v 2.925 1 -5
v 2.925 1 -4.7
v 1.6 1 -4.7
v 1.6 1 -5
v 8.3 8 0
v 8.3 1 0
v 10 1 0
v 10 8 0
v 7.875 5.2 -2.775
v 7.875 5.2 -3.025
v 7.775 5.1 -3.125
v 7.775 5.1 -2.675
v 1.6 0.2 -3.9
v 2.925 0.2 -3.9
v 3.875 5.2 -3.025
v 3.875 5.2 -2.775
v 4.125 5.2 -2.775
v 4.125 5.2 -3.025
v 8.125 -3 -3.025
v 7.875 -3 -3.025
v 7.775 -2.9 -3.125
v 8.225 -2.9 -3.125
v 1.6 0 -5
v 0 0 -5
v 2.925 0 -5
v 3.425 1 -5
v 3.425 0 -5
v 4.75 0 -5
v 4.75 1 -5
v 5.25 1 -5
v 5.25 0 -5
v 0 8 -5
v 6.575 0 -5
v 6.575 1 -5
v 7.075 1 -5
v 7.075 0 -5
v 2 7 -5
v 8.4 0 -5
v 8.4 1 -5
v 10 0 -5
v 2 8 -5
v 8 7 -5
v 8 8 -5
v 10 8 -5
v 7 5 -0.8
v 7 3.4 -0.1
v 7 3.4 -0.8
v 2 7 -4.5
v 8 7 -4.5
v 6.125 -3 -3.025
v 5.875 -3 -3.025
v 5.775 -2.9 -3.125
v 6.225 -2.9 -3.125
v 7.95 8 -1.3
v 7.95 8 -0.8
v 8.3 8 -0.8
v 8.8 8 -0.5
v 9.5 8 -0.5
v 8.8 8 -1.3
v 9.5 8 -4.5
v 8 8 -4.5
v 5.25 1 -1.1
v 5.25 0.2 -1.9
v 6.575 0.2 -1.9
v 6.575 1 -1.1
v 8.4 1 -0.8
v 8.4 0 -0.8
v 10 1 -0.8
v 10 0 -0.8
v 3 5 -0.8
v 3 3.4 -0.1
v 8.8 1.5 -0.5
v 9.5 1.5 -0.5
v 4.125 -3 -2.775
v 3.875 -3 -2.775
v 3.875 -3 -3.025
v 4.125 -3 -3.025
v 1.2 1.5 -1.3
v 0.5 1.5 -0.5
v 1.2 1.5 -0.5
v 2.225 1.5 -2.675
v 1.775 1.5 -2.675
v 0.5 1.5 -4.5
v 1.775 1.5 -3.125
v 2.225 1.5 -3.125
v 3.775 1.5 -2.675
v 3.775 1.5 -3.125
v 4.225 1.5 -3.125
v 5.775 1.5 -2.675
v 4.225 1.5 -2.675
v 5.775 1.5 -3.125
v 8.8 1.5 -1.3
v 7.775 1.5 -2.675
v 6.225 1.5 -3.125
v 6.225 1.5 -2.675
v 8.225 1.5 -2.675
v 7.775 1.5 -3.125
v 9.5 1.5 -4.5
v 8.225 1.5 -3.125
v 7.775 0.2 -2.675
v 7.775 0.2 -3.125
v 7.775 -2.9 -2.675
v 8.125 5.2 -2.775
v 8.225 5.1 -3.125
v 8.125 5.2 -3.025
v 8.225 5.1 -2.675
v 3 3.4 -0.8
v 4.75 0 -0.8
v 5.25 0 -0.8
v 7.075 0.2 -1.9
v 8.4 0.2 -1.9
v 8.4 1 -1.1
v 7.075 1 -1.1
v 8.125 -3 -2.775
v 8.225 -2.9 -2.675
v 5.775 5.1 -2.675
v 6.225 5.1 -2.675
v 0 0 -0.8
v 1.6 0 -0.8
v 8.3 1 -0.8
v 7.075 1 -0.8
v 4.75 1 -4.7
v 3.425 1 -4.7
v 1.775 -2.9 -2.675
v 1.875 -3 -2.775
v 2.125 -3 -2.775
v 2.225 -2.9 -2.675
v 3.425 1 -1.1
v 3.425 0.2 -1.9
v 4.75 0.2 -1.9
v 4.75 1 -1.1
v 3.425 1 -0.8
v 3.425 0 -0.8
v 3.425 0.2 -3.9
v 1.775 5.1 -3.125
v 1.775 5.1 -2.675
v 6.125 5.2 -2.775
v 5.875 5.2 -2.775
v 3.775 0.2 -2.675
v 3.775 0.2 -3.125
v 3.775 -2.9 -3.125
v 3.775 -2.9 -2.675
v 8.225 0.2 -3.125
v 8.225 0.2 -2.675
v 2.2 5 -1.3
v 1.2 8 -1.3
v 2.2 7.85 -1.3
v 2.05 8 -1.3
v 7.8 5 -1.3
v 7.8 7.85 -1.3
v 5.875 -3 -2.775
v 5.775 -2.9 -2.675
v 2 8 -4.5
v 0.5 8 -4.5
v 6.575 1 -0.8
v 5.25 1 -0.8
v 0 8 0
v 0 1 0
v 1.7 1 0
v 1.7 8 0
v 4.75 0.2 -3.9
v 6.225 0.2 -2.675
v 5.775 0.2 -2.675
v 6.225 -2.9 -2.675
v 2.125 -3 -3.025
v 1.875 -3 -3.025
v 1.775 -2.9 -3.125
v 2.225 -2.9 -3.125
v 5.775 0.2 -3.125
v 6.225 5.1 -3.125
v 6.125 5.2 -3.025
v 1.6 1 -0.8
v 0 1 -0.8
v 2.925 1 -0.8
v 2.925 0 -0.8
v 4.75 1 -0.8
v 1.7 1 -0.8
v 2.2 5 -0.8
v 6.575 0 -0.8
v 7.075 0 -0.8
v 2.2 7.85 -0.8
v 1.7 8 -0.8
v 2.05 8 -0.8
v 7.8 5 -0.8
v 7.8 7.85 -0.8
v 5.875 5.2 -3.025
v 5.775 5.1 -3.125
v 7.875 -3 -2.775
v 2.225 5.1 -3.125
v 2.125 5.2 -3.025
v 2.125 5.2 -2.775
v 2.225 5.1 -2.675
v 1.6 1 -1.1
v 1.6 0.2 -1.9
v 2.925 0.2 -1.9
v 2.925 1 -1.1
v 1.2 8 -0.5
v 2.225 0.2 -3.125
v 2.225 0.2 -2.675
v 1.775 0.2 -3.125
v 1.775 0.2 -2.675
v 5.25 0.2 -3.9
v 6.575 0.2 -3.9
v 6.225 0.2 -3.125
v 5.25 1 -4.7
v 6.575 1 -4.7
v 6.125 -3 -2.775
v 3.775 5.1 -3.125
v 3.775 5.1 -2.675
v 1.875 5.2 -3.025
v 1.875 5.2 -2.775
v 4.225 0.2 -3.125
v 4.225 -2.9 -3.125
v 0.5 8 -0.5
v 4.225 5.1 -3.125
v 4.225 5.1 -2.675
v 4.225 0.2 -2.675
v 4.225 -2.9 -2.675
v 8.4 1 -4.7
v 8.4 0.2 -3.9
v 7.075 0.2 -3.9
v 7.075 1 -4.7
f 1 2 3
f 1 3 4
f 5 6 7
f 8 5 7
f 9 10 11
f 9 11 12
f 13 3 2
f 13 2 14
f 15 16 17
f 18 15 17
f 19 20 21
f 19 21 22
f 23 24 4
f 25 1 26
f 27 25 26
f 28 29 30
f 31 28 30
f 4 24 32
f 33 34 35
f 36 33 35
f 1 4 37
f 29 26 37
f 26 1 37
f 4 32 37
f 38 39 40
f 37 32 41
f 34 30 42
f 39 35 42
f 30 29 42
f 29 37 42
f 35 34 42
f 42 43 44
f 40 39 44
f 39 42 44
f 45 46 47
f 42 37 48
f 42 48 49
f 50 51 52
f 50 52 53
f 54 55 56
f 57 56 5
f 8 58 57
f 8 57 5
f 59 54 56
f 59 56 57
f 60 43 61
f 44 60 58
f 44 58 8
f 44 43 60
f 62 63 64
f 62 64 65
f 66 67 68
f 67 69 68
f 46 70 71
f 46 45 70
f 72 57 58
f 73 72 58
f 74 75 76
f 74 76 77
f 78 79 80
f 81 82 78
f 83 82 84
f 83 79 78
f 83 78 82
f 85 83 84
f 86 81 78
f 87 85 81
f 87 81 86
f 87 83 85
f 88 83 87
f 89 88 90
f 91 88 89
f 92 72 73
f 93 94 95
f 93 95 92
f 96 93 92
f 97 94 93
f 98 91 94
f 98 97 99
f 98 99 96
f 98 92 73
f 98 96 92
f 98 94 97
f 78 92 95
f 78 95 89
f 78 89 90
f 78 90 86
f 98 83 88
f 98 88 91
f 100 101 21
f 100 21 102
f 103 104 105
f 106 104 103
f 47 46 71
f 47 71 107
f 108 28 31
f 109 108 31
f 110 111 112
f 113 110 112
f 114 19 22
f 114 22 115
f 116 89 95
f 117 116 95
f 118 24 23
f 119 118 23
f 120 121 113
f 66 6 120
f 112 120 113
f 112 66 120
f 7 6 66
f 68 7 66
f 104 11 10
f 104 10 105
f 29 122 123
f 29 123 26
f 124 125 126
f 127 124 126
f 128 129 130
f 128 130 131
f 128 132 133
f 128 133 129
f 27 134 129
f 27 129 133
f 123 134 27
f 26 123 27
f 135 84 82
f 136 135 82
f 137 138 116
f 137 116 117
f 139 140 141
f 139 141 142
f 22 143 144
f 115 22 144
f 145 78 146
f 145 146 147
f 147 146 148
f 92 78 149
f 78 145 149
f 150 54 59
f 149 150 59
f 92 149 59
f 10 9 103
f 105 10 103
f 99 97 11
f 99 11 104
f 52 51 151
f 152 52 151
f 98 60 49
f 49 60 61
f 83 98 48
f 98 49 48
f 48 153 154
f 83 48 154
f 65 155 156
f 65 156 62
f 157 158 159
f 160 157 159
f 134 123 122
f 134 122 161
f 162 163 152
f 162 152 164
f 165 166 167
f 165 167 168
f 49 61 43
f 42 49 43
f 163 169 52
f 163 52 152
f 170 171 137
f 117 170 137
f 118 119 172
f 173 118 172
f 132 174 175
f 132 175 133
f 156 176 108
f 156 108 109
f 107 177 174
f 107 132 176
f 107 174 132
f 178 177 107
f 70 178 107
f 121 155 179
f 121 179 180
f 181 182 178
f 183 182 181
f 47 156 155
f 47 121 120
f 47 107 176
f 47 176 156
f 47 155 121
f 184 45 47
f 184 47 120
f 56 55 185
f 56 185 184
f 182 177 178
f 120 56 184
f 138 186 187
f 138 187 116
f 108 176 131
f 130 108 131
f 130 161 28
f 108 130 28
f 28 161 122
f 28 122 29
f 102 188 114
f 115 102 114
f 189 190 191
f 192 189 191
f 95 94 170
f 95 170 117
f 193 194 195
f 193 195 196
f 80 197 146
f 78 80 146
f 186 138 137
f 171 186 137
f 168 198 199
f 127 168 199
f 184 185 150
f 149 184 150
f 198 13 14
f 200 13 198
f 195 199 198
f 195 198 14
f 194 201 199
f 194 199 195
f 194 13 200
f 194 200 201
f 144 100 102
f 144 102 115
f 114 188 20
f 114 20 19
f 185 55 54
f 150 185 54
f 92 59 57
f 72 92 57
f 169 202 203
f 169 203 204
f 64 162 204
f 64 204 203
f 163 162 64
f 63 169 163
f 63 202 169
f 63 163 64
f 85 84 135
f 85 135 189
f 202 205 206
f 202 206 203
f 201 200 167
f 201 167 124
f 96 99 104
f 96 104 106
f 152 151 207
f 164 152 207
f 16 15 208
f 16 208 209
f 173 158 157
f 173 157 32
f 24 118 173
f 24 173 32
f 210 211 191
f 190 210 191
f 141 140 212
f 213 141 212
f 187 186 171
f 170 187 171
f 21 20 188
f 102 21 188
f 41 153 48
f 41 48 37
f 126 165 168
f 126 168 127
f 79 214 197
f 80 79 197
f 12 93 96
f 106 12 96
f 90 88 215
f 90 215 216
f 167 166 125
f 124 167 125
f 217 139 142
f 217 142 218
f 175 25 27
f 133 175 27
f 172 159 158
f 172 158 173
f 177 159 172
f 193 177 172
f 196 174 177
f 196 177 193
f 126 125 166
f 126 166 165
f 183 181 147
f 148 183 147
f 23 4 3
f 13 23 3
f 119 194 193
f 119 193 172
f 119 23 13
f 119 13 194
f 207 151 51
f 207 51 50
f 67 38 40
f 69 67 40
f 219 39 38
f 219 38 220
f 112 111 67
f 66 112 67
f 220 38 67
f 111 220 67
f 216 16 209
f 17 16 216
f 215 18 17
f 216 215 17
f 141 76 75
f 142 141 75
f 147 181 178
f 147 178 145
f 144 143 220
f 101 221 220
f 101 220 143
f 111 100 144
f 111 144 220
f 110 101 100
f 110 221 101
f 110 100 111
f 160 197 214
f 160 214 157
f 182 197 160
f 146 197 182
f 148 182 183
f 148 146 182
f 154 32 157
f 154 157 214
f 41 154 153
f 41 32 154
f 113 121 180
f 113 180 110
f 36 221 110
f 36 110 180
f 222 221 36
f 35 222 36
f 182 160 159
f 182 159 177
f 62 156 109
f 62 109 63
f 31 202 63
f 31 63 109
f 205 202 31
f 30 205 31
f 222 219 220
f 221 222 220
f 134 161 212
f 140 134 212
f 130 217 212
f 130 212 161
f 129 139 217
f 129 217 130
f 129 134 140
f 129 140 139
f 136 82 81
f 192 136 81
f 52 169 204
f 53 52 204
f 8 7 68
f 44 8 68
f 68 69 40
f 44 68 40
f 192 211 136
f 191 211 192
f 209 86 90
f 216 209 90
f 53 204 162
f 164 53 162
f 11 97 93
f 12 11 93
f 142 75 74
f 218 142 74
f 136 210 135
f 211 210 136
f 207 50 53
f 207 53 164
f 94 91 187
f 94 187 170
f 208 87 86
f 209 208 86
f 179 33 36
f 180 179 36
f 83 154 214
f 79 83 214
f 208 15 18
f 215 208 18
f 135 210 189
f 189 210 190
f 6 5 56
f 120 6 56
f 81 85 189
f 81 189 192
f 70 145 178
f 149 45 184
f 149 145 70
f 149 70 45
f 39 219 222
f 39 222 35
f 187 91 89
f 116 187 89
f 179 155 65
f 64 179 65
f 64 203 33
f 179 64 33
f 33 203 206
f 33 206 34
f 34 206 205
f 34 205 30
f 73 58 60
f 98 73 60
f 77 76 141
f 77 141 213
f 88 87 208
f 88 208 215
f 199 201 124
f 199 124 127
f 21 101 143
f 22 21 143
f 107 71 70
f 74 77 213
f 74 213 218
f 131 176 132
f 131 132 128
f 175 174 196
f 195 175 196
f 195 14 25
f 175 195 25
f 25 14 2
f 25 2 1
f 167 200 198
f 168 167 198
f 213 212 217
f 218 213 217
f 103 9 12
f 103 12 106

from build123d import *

# Parameters (mm, degrees)
ESQUISSE1_W             = 10
ESQUISSE1_H             = 5
BOSS_EXTRU_1_DEPTH      = 8
ESQUISSE2_W             = 6.6
ESQUISSE2_H             = 0.8
ENL_V_MAT_EXTRU_1_DEPTH = 8
ENL_V_MAT_EXTRU_2_DEPTH = 6.5
ESQUISSE5_W             = 6
ESQUISSE5_H             = 0.5
ENL_V_MAT_EXTRU_3_DEPTH = 1
ESQUISSE6_W             = 5.6
ESQUISSE6_H             = 0.5
ENL_V_MAT_EXTRU_4_DEPTH = 3
ESQUISSE7_W             = 0.8
ESQUISSE7_H             = 1
ENL_V_MAT_EXTRU_5_DEPTH = 10
ESQUISSE8_W             = 6.8
ESQUISSE8_H             = 4.2
ENL_V_MAT_EXTRU_6_DEPTH = 1
BOSS_EXTRU_2_DEPTH      = 6.8
BOSS_EXTRU_3_DEPTH      = 2
BOSS_EXTRU_3_DEPTH_BACK = 2
ESQUISSE12_W            = 0.5
ESQUISSE12_H            = 4.2
BOSS_EXTRU_4_DEPTH      = 1
CHANFREIN1_SIZE         = 0.15
ESQUISSE13_W            = 0.45
ESQUISSE13_H            = 0.45
BOSS_EXTRU_5_DEPTH      = 3.2
BOSS_EXTRU_5_DEPTH_BACK = 5
CHANFREIN2_SIZE         = 0.1


with BuildPart() as part:
    # Esquisse1 → Boss.-Extru.1 (new body)
    with BuildSketch(Plane(origin=(0, 0, 0), x_dir=(1, 0, 0), z_dir=(0, 1, 0))):
        with Locations((5, 2.5)):
            Rectangle(ESQUISSE1_W, ESQUISSE1_H)
    extrude(amount=BOSS_EXTRU_1_DEPTH)

    # Esquisse2 → Enlèv. mat.-Extru.1 (cut)
    with BuildSketch(Plane(origin=(0, 8, 0), x_dir=(1, 0, 0), z_dir=(0, 1, 0))):
        with Locations((5, 0.4)):
            Rectangle(ESQUISSE2_W, ESQUISSE2_H)
    extrude(amount=-ENL_V_MAT_EXTRU_1_DEPTH, mode=Mode.SUBTRACT)

    # Esquisse4 → Enlèv. mat.-Extru.2 (cut)
    with BuildSketch(Plane(origin=(0, 8, 0), x_dir=(1, 0, 0), z_dir=(0, 1, 0))):
        Polygon((0.5, 0.5), (1.2, 0.5), (1.2, 1.3), (8.8, 1.3), (8.8, 0.5), (9.5, 0.5), (9.5, 4.5), (0.5, 4.5), align=None)
    extrude(amount=-ENL_V_MAT_EXTRU_2_DEPTH, mode=Mode.SUBTRACT)

    # Esquisse5 → Enlèv. mat.-Extru.3 (cut)
    with BuildSketch(Plane(origin=(0, 8, 0), x_dir=(1, 0, 0), z_dir=(0, 1, 0))):
        with Locations((5, 4.75)):
            Rectangle(ESQUISSE5_W, ESQUISSE5_H)
    extrude(amount=-ENL_V_MAT_EXTRU_3_DEPTH, mode=Mode.SUBTRACT)

    # Esquisse6 → Enlèv. mat.-Extru.4 (cut)
    with BuildSketch(Plane(origin=(0, 8, 0), x_dir=(1, 0, 0), z_dir=(0, 1, 0))):
        with Locations((5, 1.05)):
            Rectangle(ESQUISSE6_W, ESQUISSE6_H)
    extrude(amount=-ENL_V_MAT_EXTRU_4_DEPTH, mode=Mode.SUBTRACT)

    # Esquisse7 → Enlèv. mat.-Extru.5 (cut)
    with BuildSketch(Plane(origin=(10, 0, 0), x_dir=(0, 0, -1), z_dir=(1, 0, 0))):
        with Locations((0.4, 0.5)):
            Rectangle(ESQUISSE7_W, ESQUISSE7_H)
    extrude(amount=-ENL_V_MAT_EXTRU_5_DEPTH, mode=Mode.SUBTRACT)

    # Esquisse8 → Enlèv. mat.-Extru.6 (cut)
    with BuildSketch(Plane.XZ):
        with Locations((5, -2.9)):
            Rectangle(ESQUISSE8_W, ESQUISSE8_H)
    extrude(amount=-ENL_V_MAT_EXTRU_6_DEPTH, mode=Mode.SUBTRACT)

    # Esquisse9 → Boss.-Extru.2 (add)
    with BuildSketch(Plane(origin=(1.6, 0, 0), x_dir=(0, 0, -1), z_dir=(1, 0, 0))):
        Polygon((4.7, 1), (3.9, 0.2), (1.9, 0.2), (1.1, 1), align=None)
    extrude(amount=BOSS_EXTRU_2_DEPTH)

    # Esquisse11 → Boss.-Extru.3 (add, two sides)
    with BuildSketch(Plane(origin=(5, 0, 0), x_dir=(0, 0, -1), z_dir=(1, 0, 0))) as boss_extru_3_sk:
        Polygon((0.8, 5), (0.1, 3.4), (0.8, 3.4), align=None)
    extrude(amount=BOSS_EXTRU_3_DEPTH)
    extrude(boss_extru_3_sk.sketch, amount=-BOSS_EXTRU_3_DEPTH_BACK)

    # Esquisse12 → Boss.-Extru.4 (add)
    with BuildSketch(Plane(origin=(0, 1, 0), x_dir=(1, 0, 0), z_dir=(0, 1, 0))):
        with Locations((5, 2.9)):
            Rectangle(ESQUISSE12_W, ESQUISSE12_H)
        with Locations((3.175, 2.9)):
            Rectangle(ESQUISSE12_W, ESQUISSE12_H)
        with Locations((6.825, 2.9)):
            Rectangle(ESQUISSE12_W, ESQUISSE12_H)
    extrude(amount=-BOSS_EXTRU_4_DEPTH)

    # Chanfrein1
    chanfrein1_edges = [part.edges().sort_by_distance(p)[0] for p in [
        (2.2, 8, -1.05),
        (7.8, 8, -1.05),
    ]]
    chamfer(chanfrein1_edges, length=CHANFREIN1_SIZE)

    # Esquisse13 → Boss.-Extru.5 (add, two sides)
    with BuildSketch(Plane.XZ.offset(-0.2)) as boss_extru_5_sk:
        with Locations((8, -2.9)):
            Rectangle(ESQUISSE13_W, ESQUISSE13_H)
        with Locations((2, -2.9)):
            Rectangle(ESQUISSE13_W, ESQUISSE13_H)
        with Locations((4, -2.9)):
            Rectangle(ESQUISSE13_W, ESQUISSE13_H)
        with Locations((6, -2.9)):
            Rectangle(ESQUISSE13_W, ESQUISSE13_H)
    extrude(amount=BOSS_EXTRU_5_DEPTH)
    extrude(boss_extru_5_sk.sketch, amount=-BOSS_EXTRU_5_DEPTH_BACK)

    # Chanfrein2
    chanfrein2_edges = [part.edges().sort_by_distance(p)[0] for p in [
        (2.225, 5.2, -2.9),
        (2, 5.2, -3.125),
        (1.775, 5.2, -2.9),
        (2, 5.2, -2.675),
        (2.225, -3, -2.9),
        (2, -3, -2.675),
        (1.775, -3, -2.9),
        (2, -3, -3.125),
        (4.225, 5.2, -2.9),
        (4, 5.2, -3.125),
        (3.775, 5.2, -2.9),
        (4, 5.2, -2.675),
        (4.225, -3, -2.9),
        (4, -3, -2.675),
        (3.775, -3, -2.9),
        (4, -3, -3.125),
        (7.775, 5.2, -2.9),
        (8, 5.2, -2.675),
        (8.225, 5.2, -2.9),
        (8, 5.2, -3.125),
        (7.775, -3, -2.9),
        (8, -3, -3.125),
        (8.225, -3, -2.9),
        (8, -3, -2.675),
        (6, 5.2, -2.675),
        (6.225, 5.2, -2.9),
        (6, 5.2, -3.125),
        (5.775, 5.2, -2.9),
        (6, -3, -2.675),
        (5.775, -3, -2.9),
        (6, -3, -3.125),
        (6.225, -3, -2.9),
    ]]
    chamfer(chanfrein2_edges, length=CHANFREIN2_SIZE)


solid = part.part
